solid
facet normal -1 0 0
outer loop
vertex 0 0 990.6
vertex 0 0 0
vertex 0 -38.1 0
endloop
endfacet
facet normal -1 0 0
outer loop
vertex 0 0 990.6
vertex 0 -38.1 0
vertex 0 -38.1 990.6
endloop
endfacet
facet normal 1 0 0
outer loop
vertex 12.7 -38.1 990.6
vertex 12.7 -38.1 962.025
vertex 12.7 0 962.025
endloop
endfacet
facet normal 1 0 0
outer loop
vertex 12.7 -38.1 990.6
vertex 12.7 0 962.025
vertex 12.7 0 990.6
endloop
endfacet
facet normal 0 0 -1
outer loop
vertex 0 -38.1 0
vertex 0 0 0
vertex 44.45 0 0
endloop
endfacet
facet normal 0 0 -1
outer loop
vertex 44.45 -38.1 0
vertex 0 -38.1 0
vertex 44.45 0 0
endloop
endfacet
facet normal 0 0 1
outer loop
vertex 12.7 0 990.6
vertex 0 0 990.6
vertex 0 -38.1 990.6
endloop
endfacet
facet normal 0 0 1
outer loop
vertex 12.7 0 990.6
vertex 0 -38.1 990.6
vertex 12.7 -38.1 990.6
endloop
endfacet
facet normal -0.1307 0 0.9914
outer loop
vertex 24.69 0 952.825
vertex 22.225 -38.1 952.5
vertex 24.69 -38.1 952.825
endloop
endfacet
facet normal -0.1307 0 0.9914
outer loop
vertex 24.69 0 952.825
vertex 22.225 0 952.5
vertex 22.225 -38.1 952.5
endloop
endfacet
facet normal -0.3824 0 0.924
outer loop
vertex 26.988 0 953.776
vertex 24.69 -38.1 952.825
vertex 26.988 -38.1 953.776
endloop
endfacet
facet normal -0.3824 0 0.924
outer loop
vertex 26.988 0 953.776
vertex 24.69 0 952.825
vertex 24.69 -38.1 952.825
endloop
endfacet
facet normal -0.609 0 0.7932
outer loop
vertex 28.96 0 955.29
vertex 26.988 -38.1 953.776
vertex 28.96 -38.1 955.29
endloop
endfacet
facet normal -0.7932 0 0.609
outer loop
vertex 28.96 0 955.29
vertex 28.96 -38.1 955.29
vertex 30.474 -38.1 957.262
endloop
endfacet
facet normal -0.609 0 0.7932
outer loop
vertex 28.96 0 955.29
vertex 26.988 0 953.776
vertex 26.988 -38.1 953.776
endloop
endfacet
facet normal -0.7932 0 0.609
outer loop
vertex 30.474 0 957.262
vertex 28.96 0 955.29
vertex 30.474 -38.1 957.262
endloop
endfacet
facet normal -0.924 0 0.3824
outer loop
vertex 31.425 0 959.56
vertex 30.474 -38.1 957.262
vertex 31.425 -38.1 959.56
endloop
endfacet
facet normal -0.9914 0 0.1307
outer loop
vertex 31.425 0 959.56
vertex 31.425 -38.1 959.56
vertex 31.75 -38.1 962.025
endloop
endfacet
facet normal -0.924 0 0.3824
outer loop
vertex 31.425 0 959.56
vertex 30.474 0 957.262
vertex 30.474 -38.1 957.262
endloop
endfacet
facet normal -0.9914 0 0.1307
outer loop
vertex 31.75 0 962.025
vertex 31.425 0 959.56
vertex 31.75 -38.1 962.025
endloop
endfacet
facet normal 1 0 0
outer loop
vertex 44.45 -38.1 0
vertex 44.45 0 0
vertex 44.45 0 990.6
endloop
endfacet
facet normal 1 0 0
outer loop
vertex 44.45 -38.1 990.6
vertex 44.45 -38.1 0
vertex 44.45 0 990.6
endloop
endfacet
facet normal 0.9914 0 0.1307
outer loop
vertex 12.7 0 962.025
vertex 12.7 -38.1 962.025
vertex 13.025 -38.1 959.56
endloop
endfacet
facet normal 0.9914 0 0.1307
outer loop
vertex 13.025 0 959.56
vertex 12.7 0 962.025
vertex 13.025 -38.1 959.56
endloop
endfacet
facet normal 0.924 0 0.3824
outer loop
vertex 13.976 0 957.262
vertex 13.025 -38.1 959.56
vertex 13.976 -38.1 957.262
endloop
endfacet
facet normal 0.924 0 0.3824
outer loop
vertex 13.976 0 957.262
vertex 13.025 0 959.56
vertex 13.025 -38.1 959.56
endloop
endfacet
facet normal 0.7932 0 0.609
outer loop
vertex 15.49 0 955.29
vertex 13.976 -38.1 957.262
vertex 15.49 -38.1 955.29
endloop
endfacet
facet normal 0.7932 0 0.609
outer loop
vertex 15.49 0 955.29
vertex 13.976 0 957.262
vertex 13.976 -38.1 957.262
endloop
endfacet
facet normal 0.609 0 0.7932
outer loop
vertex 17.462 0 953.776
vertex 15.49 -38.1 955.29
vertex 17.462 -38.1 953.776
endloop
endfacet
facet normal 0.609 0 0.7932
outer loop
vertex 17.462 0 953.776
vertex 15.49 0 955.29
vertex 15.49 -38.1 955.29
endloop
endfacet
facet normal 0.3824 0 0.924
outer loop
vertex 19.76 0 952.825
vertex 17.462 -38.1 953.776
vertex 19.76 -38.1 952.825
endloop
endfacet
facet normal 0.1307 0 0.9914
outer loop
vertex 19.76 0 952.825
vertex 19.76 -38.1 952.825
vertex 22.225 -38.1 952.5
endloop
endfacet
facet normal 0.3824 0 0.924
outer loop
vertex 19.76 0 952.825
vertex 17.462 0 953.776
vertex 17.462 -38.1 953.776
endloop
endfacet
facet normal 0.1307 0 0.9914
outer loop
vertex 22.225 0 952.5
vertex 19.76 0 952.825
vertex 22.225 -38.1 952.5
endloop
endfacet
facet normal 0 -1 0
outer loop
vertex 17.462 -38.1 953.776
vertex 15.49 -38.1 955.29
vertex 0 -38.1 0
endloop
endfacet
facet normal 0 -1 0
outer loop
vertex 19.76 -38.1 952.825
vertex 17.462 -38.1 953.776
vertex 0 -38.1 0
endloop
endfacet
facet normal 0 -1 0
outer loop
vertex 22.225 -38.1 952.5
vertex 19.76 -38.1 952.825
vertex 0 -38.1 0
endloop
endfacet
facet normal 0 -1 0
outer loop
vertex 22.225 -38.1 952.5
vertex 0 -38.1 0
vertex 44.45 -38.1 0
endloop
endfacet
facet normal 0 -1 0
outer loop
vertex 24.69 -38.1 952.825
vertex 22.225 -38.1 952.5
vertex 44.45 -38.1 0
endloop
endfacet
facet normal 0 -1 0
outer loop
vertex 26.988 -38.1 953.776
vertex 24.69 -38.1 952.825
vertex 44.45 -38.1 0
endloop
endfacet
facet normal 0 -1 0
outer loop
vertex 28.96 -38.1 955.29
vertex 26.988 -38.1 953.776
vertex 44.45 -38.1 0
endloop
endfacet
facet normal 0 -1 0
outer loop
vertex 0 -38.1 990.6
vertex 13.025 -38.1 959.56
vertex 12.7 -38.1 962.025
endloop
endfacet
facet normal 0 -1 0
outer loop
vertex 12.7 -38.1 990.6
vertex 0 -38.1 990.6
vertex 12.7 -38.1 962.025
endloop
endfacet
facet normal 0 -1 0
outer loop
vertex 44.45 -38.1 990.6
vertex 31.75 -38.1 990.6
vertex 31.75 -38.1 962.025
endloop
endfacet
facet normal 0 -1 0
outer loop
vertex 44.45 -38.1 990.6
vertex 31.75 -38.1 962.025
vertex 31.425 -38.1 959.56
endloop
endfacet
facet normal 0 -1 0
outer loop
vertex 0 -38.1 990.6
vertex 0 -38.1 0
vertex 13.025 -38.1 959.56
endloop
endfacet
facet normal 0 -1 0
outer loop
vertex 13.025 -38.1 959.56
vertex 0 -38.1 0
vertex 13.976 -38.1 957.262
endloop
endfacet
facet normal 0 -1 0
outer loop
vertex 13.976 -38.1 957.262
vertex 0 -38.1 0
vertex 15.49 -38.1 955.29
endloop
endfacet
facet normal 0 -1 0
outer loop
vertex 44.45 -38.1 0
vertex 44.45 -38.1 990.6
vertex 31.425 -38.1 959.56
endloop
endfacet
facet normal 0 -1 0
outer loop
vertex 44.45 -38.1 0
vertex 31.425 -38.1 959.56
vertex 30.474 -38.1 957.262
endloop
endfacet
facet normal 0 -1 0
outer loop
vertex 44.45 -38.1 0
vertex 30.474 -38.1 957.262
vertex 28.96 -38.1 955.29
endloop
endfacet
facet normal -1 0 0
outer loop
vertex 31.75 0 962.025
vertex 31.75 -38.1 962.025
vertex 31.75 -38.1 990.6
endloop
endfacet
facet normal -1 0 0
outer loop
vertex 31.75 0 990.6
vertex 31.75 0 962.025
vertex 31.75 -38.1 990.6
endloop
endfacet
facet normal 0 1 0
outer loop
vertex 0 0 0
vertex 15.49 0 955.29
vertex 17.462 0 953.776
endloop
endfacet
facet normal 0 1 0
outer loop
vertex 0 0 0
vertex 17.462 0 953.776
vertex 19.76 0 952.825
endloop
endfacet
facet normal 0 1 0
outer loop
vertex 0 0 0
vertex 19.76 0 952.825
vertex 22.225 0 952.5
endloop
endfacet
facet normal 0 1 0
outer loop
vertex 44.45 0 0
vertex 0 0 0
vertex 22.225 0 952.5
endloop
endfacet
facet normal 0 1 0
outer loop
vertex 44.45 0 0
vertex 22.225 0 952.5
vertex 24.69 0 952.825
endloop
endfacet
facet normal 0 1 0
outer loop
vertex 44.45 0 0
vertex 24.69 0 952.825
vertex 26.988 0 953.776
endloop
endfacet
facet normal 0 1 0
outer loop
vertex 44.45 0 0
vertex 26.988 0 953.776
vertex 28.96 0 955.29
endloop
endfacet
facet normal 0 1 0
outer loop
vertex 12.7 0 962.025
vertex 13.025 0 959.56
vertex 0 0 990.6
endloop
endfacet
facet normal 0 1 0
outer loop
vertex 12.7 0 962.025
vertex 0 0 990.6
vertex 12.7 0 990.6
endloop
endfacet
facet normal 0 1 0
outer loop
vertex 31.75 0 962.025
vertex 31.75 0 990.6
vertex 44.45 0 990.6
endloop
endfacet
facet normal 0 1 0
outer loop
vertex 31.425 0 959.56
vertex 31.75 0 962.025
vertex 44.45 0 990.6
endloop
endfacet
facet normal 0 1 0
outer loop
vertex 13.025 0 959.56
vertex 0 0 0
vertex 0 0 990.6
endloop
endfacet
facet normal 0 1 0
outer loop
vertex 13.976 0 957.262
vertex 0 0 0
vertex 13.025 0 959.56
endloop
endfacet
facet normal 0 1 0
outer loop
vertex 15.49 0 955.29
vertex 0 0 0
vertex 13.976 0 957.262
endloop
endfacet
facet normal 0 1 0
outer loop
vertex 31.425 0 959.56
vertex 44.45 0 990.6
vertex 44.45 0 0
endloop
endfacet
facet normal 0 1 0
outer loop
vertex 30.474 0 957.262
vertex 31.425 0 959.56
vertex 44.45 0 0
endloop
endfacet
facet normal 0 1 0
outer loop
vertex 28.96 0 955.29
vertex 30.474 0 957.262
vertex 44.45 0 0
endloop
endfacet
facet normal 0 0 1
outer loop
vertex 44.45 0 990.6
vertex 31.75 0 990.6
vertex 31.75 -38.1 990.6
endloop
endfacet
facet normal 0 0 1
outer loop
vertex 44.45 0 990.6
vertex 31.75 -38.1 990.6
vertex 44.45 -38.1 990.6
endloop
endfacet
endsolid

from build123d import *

# Parameters (mm, degrees)
F0_W     = 44.45
F0_H     = 990.6
F1_DEPTH = 38.1
F2_W     = 19.05
F2_H     = 38.1
F3_DEPTH = 38.101
F4_R     = 9.52499


# Not quite as in the source:
# - a fillet or chamfer is up to 0.001 mm smaller than in the source, because OpenCascade refuses the exact size


with BuildPart() as f1:
    # F0 (on Front) → F1 (new body)
    with BuildSketch(Plane.XZ):
        with Locations((22.225, 495.3)):
            Rectangle(F0_W, F0_H)
    extrude(amount=F1_DEPTH)

    # F2 (on face) → F3 (cut, through all)
    with BuildSketch(Plane.XZ.offset(38.1)):
        with Locations((22.225, 971.55)):
            Rectangle(F2_W, F2_H)
    extrude(amount=-F3_DEPTH, mode=Mode.SUBTRACT)

    # F4 (radius 9.525 in the source; OpenCascade refuses exactly that, so slightly less here)
    f4_edges = [f1.edges().sort_by_distance(p)[0] for p in [
        (12.7, -19.05, 952.5),
        (31.75, -19.05, 952.5),
    ]]
    fillet(f4_edges, radius=F4_R)


solid = f1.part
